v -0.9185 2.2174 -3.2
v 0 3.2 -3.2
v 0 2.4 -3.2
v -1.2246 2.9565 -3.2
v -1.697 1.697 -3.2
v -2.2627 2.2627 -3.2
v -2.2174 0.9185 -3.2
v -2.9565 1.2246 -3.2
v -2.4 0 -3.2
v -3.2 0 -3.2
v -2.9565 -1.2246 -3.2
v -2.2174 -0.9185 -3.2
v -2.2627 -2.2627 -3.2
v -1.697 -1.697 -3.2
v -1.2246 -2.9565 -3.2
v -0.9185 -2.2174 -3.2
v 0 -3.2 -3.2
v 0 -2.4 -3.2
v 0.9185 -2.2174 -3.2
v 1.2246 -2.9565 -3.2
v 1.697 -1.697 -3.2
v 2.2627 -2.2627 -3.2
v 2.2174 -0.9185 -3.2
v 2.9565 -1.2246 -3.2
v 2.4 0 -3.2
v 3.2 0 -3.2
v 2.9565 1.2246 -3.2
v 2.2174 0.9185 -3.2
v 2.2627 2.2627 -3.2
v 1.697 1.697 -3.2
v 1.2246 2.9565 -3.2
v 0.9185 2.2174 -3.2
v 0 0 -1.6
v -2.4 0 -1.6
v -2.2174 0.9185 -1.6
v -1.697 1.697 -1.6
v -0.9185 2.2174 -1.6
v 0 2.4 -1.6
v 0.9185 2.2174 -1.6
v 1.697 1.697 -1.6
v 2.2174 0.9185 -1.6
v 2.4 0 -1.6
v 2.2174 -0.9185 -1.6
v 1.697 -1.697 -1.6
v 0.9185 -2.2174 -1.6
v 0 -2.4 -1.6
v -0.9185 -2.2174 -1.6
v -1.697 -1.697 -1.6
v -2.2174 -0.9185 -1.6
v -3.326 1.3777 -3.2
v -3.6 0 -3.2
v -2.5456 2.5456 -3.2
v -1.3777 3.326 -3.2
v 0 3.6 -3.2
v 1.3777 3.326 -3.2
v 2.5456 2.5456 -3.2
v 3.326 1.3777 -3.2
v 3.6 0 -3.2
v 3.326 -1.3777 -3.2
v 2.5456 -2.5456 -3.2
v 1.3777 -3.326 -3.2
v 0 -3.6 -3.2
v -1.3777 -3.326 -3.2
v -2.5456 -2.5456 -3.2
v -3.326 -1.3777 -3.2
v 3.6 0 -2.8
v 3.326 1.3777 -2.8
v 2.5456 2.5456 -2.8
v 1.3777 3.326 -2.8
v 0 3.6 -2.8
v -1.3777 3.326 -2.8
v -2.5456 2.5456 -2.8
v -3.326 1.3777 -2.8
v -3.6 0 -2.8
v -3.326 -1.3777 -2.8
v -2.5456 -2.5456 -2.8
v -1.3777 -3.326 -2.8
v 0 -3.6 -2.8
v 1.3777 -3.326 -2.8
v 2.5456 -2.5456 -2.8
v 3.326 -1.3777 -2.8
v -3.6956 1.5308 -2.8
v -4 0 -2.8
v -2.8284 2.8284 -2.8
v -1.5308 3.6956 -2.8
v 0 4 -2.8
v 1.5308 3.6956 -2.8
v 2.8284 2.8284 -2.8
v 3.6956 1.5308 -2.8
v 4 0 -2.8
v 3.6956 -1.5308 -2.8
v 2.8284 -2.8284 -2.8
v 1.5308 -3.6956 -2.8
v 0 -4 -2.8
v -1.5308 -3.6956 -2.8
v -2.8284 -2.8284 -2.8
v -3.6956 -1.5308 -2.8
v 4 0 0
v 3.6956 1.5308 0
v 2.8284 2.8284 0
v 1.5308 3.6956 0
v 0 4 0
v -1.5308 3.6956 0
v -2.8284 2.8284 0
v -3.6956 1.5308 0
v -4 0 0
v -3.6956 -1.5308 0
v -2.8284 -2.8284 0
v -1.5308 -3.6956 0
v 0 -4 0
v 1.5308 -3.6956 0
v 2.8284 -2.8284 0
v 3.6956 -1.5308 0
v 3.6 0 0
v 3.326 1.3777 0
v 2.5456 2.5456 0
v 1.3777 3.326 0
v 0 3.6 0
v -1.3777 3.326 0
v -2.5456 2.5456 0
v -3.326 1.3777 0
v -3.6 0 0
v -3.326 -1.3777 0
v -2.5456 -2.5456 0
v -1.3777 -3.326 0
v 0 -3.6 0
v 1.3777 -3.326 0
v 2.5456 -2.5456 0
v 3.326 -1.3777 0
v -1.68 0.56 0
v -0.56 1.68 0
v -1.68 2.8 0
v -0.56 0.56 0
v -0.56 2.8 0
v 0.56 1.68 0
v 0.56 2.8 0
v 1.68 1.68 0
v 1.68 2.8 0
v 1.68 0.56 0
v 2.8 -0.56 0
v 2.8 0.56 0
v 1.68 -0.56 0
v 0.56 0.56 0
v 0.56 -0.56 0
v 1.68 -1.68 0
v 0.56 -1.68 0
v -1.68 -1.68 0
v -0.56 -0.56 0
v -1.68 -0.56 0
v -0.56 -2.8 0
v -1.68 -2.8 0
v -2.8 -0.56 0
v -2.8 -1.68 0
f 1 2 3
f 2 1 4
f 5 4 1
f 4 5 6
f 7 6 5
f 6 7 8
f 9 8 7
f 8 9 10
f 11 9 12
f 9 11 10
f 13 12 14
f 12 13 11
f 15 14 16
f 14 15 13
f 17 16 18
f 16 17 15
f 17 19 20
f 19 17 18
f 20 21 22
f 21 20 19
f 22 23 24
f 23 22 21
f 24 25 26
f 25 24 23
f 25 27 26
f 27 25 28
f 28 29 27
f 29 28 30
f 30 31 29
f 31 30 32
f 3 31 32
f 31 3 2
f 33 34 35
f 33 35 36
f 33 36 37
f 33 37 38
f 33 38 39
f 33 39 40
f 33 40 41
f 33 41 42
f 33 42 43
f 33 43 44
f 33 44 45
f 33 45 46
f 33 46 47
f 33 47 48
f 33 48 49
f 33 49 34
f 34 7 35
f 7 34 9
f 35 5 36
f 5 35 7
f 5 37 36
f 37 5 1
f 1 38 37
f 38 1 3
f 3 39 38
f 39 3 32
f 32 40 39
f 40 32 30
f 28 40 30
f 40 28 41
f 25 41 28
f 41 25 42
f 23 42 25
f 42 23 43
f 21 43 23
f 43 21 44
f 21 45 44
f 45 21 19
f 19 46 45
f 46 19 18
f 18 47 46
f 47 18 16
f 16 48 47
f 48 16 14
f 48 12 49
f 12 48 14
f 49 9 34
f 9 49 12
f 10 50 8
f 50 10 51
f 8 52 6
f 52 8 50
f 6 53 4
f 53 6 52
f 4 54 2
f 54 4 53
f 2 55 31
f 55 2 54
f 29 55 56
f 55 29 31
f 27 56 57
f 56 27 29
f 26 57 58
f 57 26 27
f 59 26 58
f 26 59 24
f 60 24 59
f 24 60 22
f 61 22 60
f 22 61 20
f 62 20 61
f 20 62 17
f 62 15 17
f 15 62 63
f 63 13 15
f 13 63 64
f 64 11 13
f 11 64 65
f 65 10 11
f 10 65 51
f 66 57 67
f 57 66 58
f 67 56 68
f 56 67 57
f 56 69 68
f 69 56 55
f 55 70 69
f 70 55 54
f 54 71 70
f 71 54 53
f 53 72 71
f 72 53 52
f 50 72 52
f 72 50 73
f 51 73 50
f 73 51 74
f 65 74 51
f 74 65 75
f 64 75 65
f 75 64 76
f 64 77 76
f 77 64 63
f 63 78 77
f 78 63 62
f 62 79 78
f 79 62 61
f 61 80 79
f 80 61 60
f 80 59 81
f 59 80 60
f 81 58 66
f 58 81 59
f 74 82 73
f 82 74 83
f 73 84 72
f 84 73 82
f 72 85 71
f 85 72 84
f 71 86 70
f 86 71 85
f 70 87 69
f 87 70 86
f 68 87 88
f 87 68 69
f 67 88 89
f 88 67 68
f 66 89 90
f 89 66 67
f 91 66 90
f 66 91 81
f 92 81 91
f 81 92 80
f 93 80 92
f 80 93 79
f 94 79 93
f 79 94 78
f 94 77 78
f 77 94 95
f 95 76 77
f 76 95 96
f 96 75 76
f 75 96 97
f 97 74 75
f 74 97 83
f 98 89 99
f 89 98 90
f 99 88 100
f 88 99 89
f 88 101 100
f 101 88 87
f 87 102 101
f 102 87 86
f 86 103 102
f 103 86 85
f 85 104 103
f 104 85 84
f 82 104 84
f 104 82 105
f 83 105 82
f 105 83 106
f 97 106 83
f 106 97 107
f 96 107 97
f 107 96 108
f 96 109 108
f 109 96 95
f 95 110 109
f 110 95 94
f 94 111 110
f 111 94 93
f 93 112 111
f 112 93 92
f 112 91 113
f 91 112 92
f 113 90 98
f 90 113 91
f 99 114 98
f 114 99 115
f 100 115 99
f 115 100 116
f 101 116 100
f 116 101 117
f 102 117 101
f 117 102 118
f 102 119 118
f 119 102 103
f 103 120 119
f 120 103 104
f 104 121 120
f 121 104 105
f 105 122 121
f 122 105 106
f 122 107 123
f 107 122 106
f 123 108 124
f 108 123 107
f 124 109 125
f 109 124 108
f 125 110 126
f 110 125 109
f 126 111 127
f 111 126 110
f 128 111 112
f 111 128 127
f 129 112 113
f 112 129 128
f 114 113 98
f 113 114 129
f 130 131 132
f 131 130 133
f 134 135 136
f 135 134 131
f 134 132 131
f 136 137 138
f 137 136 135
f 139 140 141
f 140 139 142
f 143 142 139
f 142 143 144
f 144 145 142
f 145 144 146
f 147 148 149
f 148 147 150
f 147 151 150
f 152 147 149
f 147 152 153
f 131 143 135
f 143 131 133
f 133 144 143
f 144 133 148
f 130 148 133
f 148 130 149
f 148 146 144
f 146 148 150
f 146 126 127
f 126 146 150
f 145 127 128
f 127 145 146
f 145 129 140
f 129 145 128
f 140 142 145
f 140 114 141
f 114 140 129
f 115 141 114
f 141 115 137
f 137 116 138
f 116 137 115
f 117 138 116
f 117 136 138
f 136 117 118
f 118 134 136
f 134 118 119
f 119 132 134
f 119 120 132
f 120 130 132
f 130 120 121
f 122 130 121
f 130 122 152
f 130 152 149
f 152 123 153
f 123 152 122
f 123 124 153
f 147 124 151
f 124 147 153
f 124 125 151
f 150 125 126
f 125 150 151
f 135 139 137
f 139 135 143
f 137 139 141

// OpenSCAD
// file: ../p/4-4disc.scad
use <../lib.scad>
function ldraw_lib__4_4disc() = [
// 0 Disc 1.0
// 0 Name: 4-4disc.dat
// 0 Author: James Jessiman
// 0 !LDRAW_ORG Primitive UPDATE 2002-02
// 0 !LICENSE Licensed under CC BY 4.0 : see CAreadme.txt
// 
// 0 BFC CERTIFY CCW
  [0,"BFC","CERTIFY"],
  [0,"BFC","CCW"],
// 
// 0 !HISTORY 1998-12-15 [PTadmin] Official Update 1998-10
// 0 !HISTORY 2002-03-23 [sbliss] Added BFC statement
// 0 !HISTORY 2002-04-25 [PTadmin] Official Update 2002-02
// 0 !HISTORY 2007-06-24 [PTadmin] Header formatted for Contributor Agreement
// 0 !HISTORY 2008-07-01 [PTadmin] Official Update 2008-01
// 
// 
// 3 16 0 0 0 1 0 0 0.9239 0 0.3827
  [3,16,0,0,0,1,0,0,0.9239,0,0.3827],
// 3 16 0 0 0 0.9239 0 0.3827 0.7071 0 0.7071
  [3,16,0,0,0,0.9239,0,0.3827,0.7071,0,0.7071],
// 3 16 0 0 0 0.7071 0 0.7071 0.3827 0 0.9239
  [3,16,0,0,0,0.7071,0,0.7071,0.3827,0,0.9239],
// 3 16 0 0 0 0.3827 0 0.9239 0 0 1
  [3,16,0,0,0,0.3827,0,0.9239,0,0,1],
// 3 16 0 0 0 0 0 1 -0.3827 0 0.9239
  [3,16,0,0,0,0,0,1,-0.3827,0,0.9239],
// 3 16 0 0 0 -0.3827 0 0.9239 -0.7071 0 0.7071
  [3,16,0,0,0,-0.3827,0,0.9239,-0.7071,0,0.7071],
// 3 16 0 0 0 -0.7071 0 0.7071 -0.9239 0 0.3827
  [3,16,0,0,0,-0.7071,0,0.7071,-0.9239,0,0.3827],
// 3 16 0 0 0 -0.9239 0 0.3827 -1 0 -0
  [3,16,0,0,0,-0.9239,0,0.3827,-1,0,-0],
// 3 16 0 0 0 -1 0 -0 -0.9239 0 -0.3827
  [3,16,0,0,0,-1,0,-0,-0.9239,0,-0.3827],
// 3 16 0 0 0 -0.9239 0 -0.3827 -0.7071 0 -0.7071
  [3,16,0,0,0,-0.9239,0,-0.3827,-0.7071,0,-0.7071],
// 3 16 0 0 0 -0.7071 0 -0.7071 -0.3827 0 -0.9239
  [3,16,0,0,0,-0.7071,0,-0.7071,-0.3827,0,-0.9239],
// 3 16 0 0 0 -0.3827 0 -0.9239 0 0 -1
  [3,16,0,0,0,-0.3827,0,-0.9239,0,0,-1],
// 3 16 0 0 0 0 0 -1 0.3827 0 -0.9239
  [3,16,0,0,0,0,0,-1,0.3827,0,-0.9239],
// 3 16 0 0 0 0.3827 0 -0.9239 0.7071 0 -0.7071
  [3,16,0,0,0,0.3827,0,-0.9239,0.7071,0,-0.7071],
// 3 16 0 0 0 0.7071 0 -0.7071 0.9239 0 -0.3827
  [3,16,0,0,0,0.7071,0,-0.7071,0.9239,0,-0.3827],
// 3 16 0 0 0 0.9239 0 -0.3827 1 0 0
  [3,16,0,0,0,0.9239,0,-0.3827,1,0,0],
// 0
];
module ldraw_lib__4_4disc(step=0, col=false, unit=2/5, alt=false, line=0.2, solid=!$preview)
    makepoly(ldraw_lib__4_4disc(), step=step, col=col, unit=unit, alt=alt, line=line, solid=solid);
ldraw_lib__4_4disc(line=0.2);
// file: ../p/4-4ring3.scad
use <../lib.scad>
function ldraw_lib__4_4ring3() = [
// 0 Ring  3 x 1.0
// 0 Name: 4-4ring3.dat
// 0 Author: James Jessiman
// 0 !LDRAW_ORG Primitive UPDATE 2009-01
// 0 !LICENSE Licensed under CC BY 4.0 : see CAreadme.txt
// 
// 0 BFC CERTIFY CCW
  [0,"BFC","CERTIFY"],
  [0,"BFC","CCW"],
// 
// 0 !HISTORY 1998-12-15 [PTadmin] Official Update 1998-10
// 0 !HISTORY 2002-04-05 [hafhead] Added BFC statement
// 0 !HISTORY 2002-04-25 [PTadmin] Official Update 2002-02
// 0 !HISTORY 2007-06-24 [PTadmin] Header formatted for Contributor Agreement
// 0 !HISTORY 2008-07-01 [PTadmin] Official Update 2008-01
// 0 !HISTORY 2008-08-26 [cwdee] Switch polygon winding and rename
// 0 !HISTORY 2009-05-02 [PTadmin] Official Update 2009-01
// 
// 
// 4 16 -1.5308 0 3.6956 -1.1481 0 2.7717 0 0 3 0 0 4
  [4,16,-1.5308,0,3.6956,-1.1481,0,2.7717,0,0,3,0,0,4],
// 4 16 -2.8284 0 2.8284 -2.1213 0 2.1213 -1.1481 0 2.7717 -1.5308 0 3.6956
  [4,16,-2.8284,0,2.8284,-2.1213,0,2.1213,-1.1481,0,2.7717,-1.5308,0,3.6956],
// 4 16 -3.6956 0 1.5308 -2.7717 0 1.1481 -2.1213 0 2.1213 -2.8284 0 2.8284
  [4,16,-3.6956,0,1.5308,-2.7717,0,1.1481,-2.1213,0,2.1213,-2.8284,0,2.8284],
// 4 16 -4 0 0 -3 0 0 -2.7717 0 1.1481 -3.6956 0 1.5308
  [4,16,-4,0,0,-3,0,0,-2.7717,0,1.1481,-3.6956,0,1.5308],
// 4 16 -3.6956 0 -1.5308 -2.7717 0 -1.1481 -3 0 0 -4 0 0
  [4,16,-3.6956,0,-1.5308,-2.7717,0,-1.1481,-3,0,0,-4,0,0],
// 4 16 -2.8284 0 -2.8284 -2.1213 0 -2.1213 -2.7717 0 -1.1481 -3.6956 0 -1.5308
  [4,16,-2.8284,0,-2.8284,-2.1213,0,-2.1213,-2.7717,0,-1.1481,-3.6956,0,-1.5308],
// 4 16 -1.5308 0 -3.6956 -1.1481 0 -2.7717 -2.1213 0 -2.1213 -2.8284 0 -2.8284
  [4,16,-1.5308,0,-3.6956,-1.1481,0,-2.7717,-2.1213,0,-2.1213,-2.8284,0,-2.8284],
// 4 16 0 0 -4 0 0 -3 -1.1481 0 -2.7717 -1.5308 0 -3.6956
  [4,16,0,0,-4,0,0,-3,-1.1481,0,-2.7717,-1.5308,0,-3.6956],
// 4 16 1.5308 0 -3.6956 1.1481 0 -2.7717 0 0 -3 0 0 -4
  [4,16,1.5308,0,-3.6956,1.1481,0,-2.7717,0,0,-3,0,0,-4],
// 4 16 2.8284 0 -2.8284 2.1213 0 -2.1213 1.1481 0 -2.7717 1.5308 0 -3.6956
  [4,16,2.8284,0,-2.8284,2.1213,0,-2.1213,1.1481,0,-2.7717,1.5308,0,-3.6956],
// 4 16 3.6956 0 -1.5308 2.7717 0 -1.1481 2.1213 0 -2.1213 2.8284 0 -2.8284
  [4,16,3.6956,0,-1.5308,2.7717,0,-1.1481,2.1213,0,-2.1213,2.8284,0,-2.8284],
// 4 16 4 0 0 3 0 0 2.7717 0 -1.1481 3.6956 0 -1.5308
  [4,16,4,0,0,3,0,0,2.7717,0,-1.1481,3.6956,0,-1.5308],
// 4 16 3.6956 0 1.5308 2.7717 0 1.1481 3 0 0 4 0 0
  [4,16,3.6956,0,1.5308,2.7717,0,1.1481,3,0,0,4,0,0],
// 4 16 2.8284 0 2.8284 2.1213 0 2.1213 2.7717 0 1.1481 3.6956 0 1.5308
  [4,16,2.8284,0,2.8284,2.1213,0,2.1213,2.7717,0,1.1481,3.6956,0,1.5308],
// 4 16 1.5308 0 3.6956 1.1481 0 2.7717 2.1213 0 2.1213 2.8284 0 2.8284
  [4,16,1.5308,0,3.6956,1.1481,0,2.7717,2.1213,0,2.1213,2.8284,0,2.8284],
// 4 16 0 0 4 0 0 3 1.1481 0 2.7717 1.5308 0 3.6956
  [4,16,0,0,4,0,0,3,1.1481,0,2.7717,1.5308,0,3.6956],
// 0
];
module ldraw_lib__4_4ring3(step=0, col=false, unit=2/5, alt=false, line=0.2, solid=!$preview)
    makepoly(ldraw_lib__4_4ring3(), step=step, col=col, unit=unit, alt=alt, line=line, solid=solid);
ldraw_lib__4_4ring3(line=0.2);
// file: ../p/4-4cylc.scad
use <../lib.scad>
use <4-4cyli.scad>
use <4-4disc.scad>
use <4-4edge.scad>
function ldraw_lib__4_4cylc() = [
// 0 Cylinder Closed 1.0
// 0 Name: 4-4cylc.dat
// 0 Author: Alex Taylor [anathema]
// 0 !LDRAW_ORG Primitive UPDATE 2009-02
// 0 !LICENSE Licensed under CC BY 4.0 : see CAreadme.txt
// 
// 0 BFC CERTIFY CCW
  [0,"BFC","CERTIFY"],
  [0,"BFC","CCW"],
// 
// 0 !HISTORY 2008-12-29 [cwdee] Removed one disc
// 0 !HISTORY 2009-09-03 [PTadmin] Official Update 2009-02
// 
// 
// 1 16 0 0 0 1 0 0 0 1 0 0 0 1 4-4edge.dat
  [1,16,0,0,0,1,0,0,0,1,0,0,0,1, ldraw_lib__4_4edge()],
// 1 16 0 1 0 1 0 0 0 1 0 0 0 1 4-4edge.dat
  [1,16,0,1,0,1,0,0,0,1,0,0,0,1, ldraw_lib__4_4edge()],
// 1 16 0 0 0 1 0 0 0 1 0 0 0 1 4-4disc.dat
  [1,16,0,0,0,1,0,0,0,1,0,0,0,1, ldraw_lib__4_4disc()],
// 1 16 0 0 0 1 0 0 0 1 0 0 0 1 4-4cyli.dat
  [1,16,0,0,0,1,0,0,0,1,0,0,0,1, ldraw_lib__4_4cyli()],
// 0
];
module ldraw_lib__4_4cylc(step=0, col=false, unit=2/5, alt=false, line=0.2, solid=!$preview)
    makepoly(ldraw_lib__4_4cylc(), step=step, col=col, unit=unit, alt=alt, line=line, solid=solid);
ldraw_lib__4_4cylc(line=0.2);
// file: ../p/4-4edge.scad
use <../lib.scad>
function ldraw_lib__4_4edge() = [
// 0 Circle 1.0
// 0 Name: 4-4edge.dat
// 0 Author: James Jessiman
// 0 !LDRAW_ORG Primitive UPDATE 2017-01
// 0 !LICENSE Licensed under CC BY 4.0 : see CAreadme.txt
// 
// 0 BFC CERTIFY CCW
  [0,"BFC","CERTIFY"],
  [0,"BFC","CCW"],
// 
// 0 !HISTORY 1998-12-15 [PTadmin] Official Update 1998-10
// 0 !HISTORY 2005-12-28 [PTadmin] Official Update 2005-01
// 0 !HISTORY 2007-06-24 [PTadmin] Header formatted for Contributor Agreement
// 0 !HISTORY 2008-07-01 [PTadmin] Official Update 2008-01
// 0 !HISTORY 2017-01-15 [Steffen] BFCed
// 0 !HISTORY 2017-12-30 [PTadmin] Official Update 2017-01
// 
// 
// 2 24 1 0 0 0.9239 0 0.3827
  [2,24,1,0,0,0.9239,0,0.3827],
// 2 24 0.9239 0 0.3827 0.7071 0 0.7071
  [2,24,0.9239,0,0.3827,0.7071,0,0.7071],
// 2 24 0.7071 0 0.7071 0.3827 0 0.9239
  [2,24,0.7071,0,0.7071,0.3827,0,0.9239],
// 2 24 0.3827 0 0.9239 0 0 1
  [2,24,0.3827,0,0.9239,0,0,1],
// 2 24 0 0 1 -0.3827 0 0.9239
  [2,24,0,0,1,-0.3827,0,0.9239],
// 2 24 -0.3827 0 0.9239 -0.7071 0 0.7071
  [2,24,-0.3827,0,0.9239,-0.7071,0,0.7071],
// 2 24 -0.7071 0 0.7071 -0.9239 0 0.3827
  [2,24,-0.7071,0,0.7071,-0.9239,0,0.3827],
// 2 24 -0.9239 0 0.3827 -1 0 -0
  [2,24,-0.9239,0,0.3827,-1,0,-0],
// 2 24 -1 0 -0 -0.9239 0 -0.3827
  [2,24,-1,0,-0,-0.9239,0,-0.3827],
// 2 24 -0.9239 0 -0.3827 -0.7071 0 -0.7071
  [2,24,-0.9239,0,-0.3827,-0.7071,0,-0.7071],
// 2 24 -0.7071 0 -0.7071 -0.3827 0 -0.9239
  [2,24,-0.7071,0,-0.7071,-0.3827,0,-0.9239],
// 2 24 -0.3827 0 -0.9239 0 0 -1
  [2,24,-0.3827,0,-0.9239,0,0,-1],
// 2 24 0 0 -1 0.3827 0 -0.9239
  [2,24,0,0,-1,0.3827,0,-0.9239],
// 2 24 0.3827 0 -0.9239 0.7071 0 -0.7071
  [2,24,0.3827,0,-0.9239,0.7071,0,-0.7071],
// 2 24 0.7071 0 -0.7071 0.9239 0 -0.3827
  [2,24,0.7071,0,-0.7071,0.9239,0,-0.3827],
// 2 24 0.9239 0 -0.3827 1 0 0
  [2,24,0.9239,0,-0.3827,1,0,0],
];
module ldraw_lib__4_4edge(step=0, col=false, unit=2/5, alt=false, line=0.2, solid=!$preview)
    makepoly(ldraw_lib__4_4edge(), step=step, col=col, unit=unit, alt=alt, line=line, solid=solid);
ldraw_lib__4_4edge(line=0.2);
// file: ../p/4-4cyli.scad
use <../lib.scad>
function ldraw_lib__4_4cyli() = [
// 0 Cylinder 1.0
// 0 Name: 4-4cyli.dat
// 0 Author: James Jessiman
// 0 !LDRAW_ORG Primitive UPDATE 2005-01
// 0 !LICENSE Licensed under CC BY 4.0 : see CAreadme.txt
// 
// 0 BFC CERTIFY CCW
  [0,"BFC","CERTIFY"],
  [0,"BFC","CCW"],
// 
// 0 !HISTORY 1998-12-15 [PTadmin] Official Update 1998-10
// 0 !HISTORY 2002-03-23 [sbliss] Added BFC statement; merged headers from files in distributions LDraw 0.27 and Complete.
// 0 !HISTORY 2002-04-25 [PTadmin] Official Update 2002-02
// 0 !HISTORY 2004-12-14 [guyvivan] BFC CCW
// 0 !HISTORY 2005-12-28 [PTadmin] Official Update 2005-01
// 0 !HISTORY 2007-06-24 [PTadmin] Header formatted for Contributor Agreement
// 0 !HISTORY 2008-07-01 [PTadmin] Official Update 2008-01
// 
// 
// 4 16 1 1 0 0.9239 1 0.3827 0.9239 0 0.3827 1 0 0
  [4,16,1,1,0,0.9239,1,0.3827,0.9239,0,0.3827,1,0,0],
// 5 24 1 0 0 1 1 0 0.9239 0 0.3827 0.9239 0 -0.3827
  [5,24,1,0,0,1,1,0,0.9239,0,0.3827,0.9239,0,-0.3827],
// 4 16 0.9239 1 0.3827 0.7071 1 0.7071 0.7071 0 0.7071 0.9239 0 0.3827
  [4,16,0.9239,1,0.3827,0.7071,1,0.7071,0.7071,0,0.7071,0.9239,0,0.3827],
// 5 24 0.9239 0 0.3827 0.9239 1 0.3827 0.7071 0 0.7071 1 0 0
  [5,24,0.9239,0,0.3827,0.9239,1,0.3827,0.7071,0,0.7071,1,0,0],
// 4 16 0.7071 1 0.7071 0.3827 1 0.9239 0.3827 0 0.9239 0.7071 0 0.7071
  [4,16,0.7071,1,0.7071,0.3827,1,0.9239,0.3827,0,0.9239,0.7071,0,0.7071],
// 5 24 0.7071 0 0.7071 0.7071 1 0.7071 0.3827 0 0.9239 0.9239 0 0.3827
  [5,24,0.7071,0,0.7071,0.7071,1,0.7071,0.3827,0,0.9239,0.9239,0,0.3827],
// 4 16 0.3827 1 0.9239 0 1 1 0 0 1 0.3827 0 0.9239
  [4,16,0.3827,1,0.9239,0,1,1,0,0,1,0.3827,0,0.9239],
// 5 24 0.3827 0 0.9239 0.3827 1 0.9239 0 0 1 0.7071 0 0.7071
  [5,24,0.3827,0,0.9239,0.3827,1,0.9239,0,0,1,0.7071,0,0.7071],
// 4 16 0 1 1 -0.3827 1 0.9239 -0.3827 0 0.9239 0 0 1
  [4,16,0,1,1,-0.3827,1,0.9239,-0.3827,0,0.9239,0,0,1],
// 5 24 0 0 1 0 1 1 -0.3827 0 0.9239 0.3827 0 0.9239
  [5,24,0,0,1,0,1,1,-0.3827,0,0.9239,0.3827,0,0.9239],
// 4 16 -0.3827 1 0.9239 -0.7071 1 0.7071 -0.7071 0 0.7071 -0.3827 0 0.9239
  [4,16,-0.3827,1,0.9239,-0.7071,1,0.7071,-0.7071,0,0.7071,-0.3827,0,0.9239],
// 5 24 -0.3827 0 0.9239 -0.3827 1 0.9239 -0.7071 0 0.7071 0 0 1
  [5,24,-0.3827,0,0.9239,-0.3827,1,0.9239,-0.7071,0,0.7071,0,0,1],
// 4 16 -0.7071 1 0.7071 -0.9239 1 0.3827 -0.9239 0 0.3827 -0.7071 0 0.7071
  [4,16,-0.7071,1,0.7071,-0.9239,1,0.3827,-0.9239,0,0.3827,-0.7071,0,0.7071],
// 5 24 -0.7071 0 0.7071 -0.7071 1 0.7071 -0.9239 0 0.3827 -0.3827 0 0.9239
  [5,24,-0.7071,0,0.7071,-0.7071,1,0.7071,-0.9239,0,0.3827,-0.3827,0,0.9239],
// 4 16 -0.9239 1 0.3827 -1 1 0 -1 0 0 -0.9239 0 0.3827
  [4,16,-0.9239,1,0.3827,-1,1,0,-1,0,0,-0.9239,0,0.3827],
// 5 24 -0.9239 0 0.3827 -0.9239 1 0.3827 -1 0 0 -0.7071 0 0.7071
  [5,24,-0.9239,0,0.3827,-0.9239,1,0.3827,-1,0,0,-0.7071,0,0.7071],
// 4 16 -1 1 0 -0.9239 1 -0.3827 -0.9239 0 -0.3827 -1 0 0
  [4,16,-1,1,0,-0.9239,1,-0.3827,-0.9239,0,-0.3827,-1,0,0],
// 5 24 -1 0 0 -1 1 0 -0.9239 0 -0.3827 -0.9239 0 0.3827
  [5,24,-1,0,0,-1,1,0,-0.9239,0,-0.3827,-0.9239,0,0.3827],
// 4 16 -0.9239 1 -0.3827 -0.7071 1 -0.7071 -0.7071 0 -0.7071 -0.9239 0 -0.3827
  [4,16,-0.9239,1,-0.3827,-0.7071,1,-0.7071,-0.7071,0,-0.7071,-0.9239,0,-0.3827],
// 5 24 -0.9239 0 -0.3827 -0.9239 1 -0.3827 -0.7071 0 -0.7071 -1 0 0
  [5,24,-0.9239,0,-0.3827,-0.9239,1,-0.3827,-0.7071,0,-0.7071,-1,0,0],
// 4 16 -0.7071 1 -0.7071 -0.3827 1 -0.9239 -0.3827 0 -0.9239 -0.7071 0 -0.7071
  [4,16,-0.7071,1,-0.7071,-0.3827,1,-0.9239,-0.3827,0,-0.9239,-0.7071,0,-0.7071],
// 5 24 -0.7071 0 -0.7071 -0.7071 1 -0.7071 -0.3827 0 -0.9239 -0.9239 0 -0.3827
  [5,24,-0.7071,0,-0.7071,-0.7071,1,-0.7071,-0.3827,0,-0.9239,-0.9239,0,-0.3827],
// 4 16 -0.3827 1 -0.9239 0 1 -1 0 0 -1 -0.3827 0 -0.9239
  [4,16,-0.3827,1,-0.9239,0,1,-1,0,0,-1,-0.3827,0,-0.9239],
// 5 24 -0.3827 0 -0.9239 -0.3827 1 -0.9239 0 0 -1 -0.7071 0 -0.7071
  [5,24,-0.3827,0,-0.9239,-0.3827,1,-0.9239,0,0,-1,-0.7071,0,-0.7071],
// 4 16 0 1 -1 0.3827 1 -0.9239 0.3827 0 -0.9239 0 0 -1
  [4,16,0,1,-1,0.3827,1,-0.9239,0.3827,0,-0.9239,0,0,-1],
// 5 24 0 0 -1 0 1 -1 0.3827 0 -0.9239 -0.3827 0 -0.9239
  [5,24,0,0,-1,0,1,-1,0.3827,0,-0.9239,-0.3827,0,-0.9239],
// 4 16 0.3827 1 -0.9239 0.7071 1 -0.7071 0.7071 0 -0.7071 0.3827 0 -0.9239
  [4,16,0.3827,1,-0.9239,0.7071,1,-0.7071,0.7071,0,-0.7071,0.3827,0,-0.9239],
// 5 24 0.3827 0 -0.9239 0.3827 1 -0.9239 0.7071 0 -0.7071 0 0 -1
  [5,24,0.3827,0,-0.9239,0.3827,1,-0.9239,0.7071,0,-0.7071,0,0,-1],
// 4 16 0.7071 1 -0.7071 0.9239 1 -0.3827 0.9239 0 -0.3827 0.7071 0 -0.7071
  [4,16,0.7071,1,-0.7071,0.9239,1,-0.3827,0.9239,0,-0.3827,0.7071,0,-0.7071],
// 5 24 0.7071 0 -0.7071 0.7071 1 -0.7071 0.9239 0 -0.3827 0.3827 0 -0.9239
  [5,24,0.7071,0,-0.7071,0.7071,1,-0.7071,0.9239,0,-0.3827,0.3827,0,-0.9239],
// 4 16 0.9239 1 -0.3827 1 1 0 1 0 0 0.9239 0 -0.3827
  [4,16,0.9239,1,-0.3827,1,1,0,1,0,0,0.9239,0,-0.3827],
// 5 24 0.9239 0 -0.3827 0.9239 1 -0.3827 1 0 0 0.7071 0 -0.7071
  [5,24,0.9239,0,-0.3827,0.9239,1,-0.3827,1,0,0,0.7071,0,-0.7071],
// 0
];
module ldraw_lib__4_4cyli(step=0, col=false, unit=2/5, alt=false, line=0.2, solid=!$preview)
    makepoly(ldraw_lib__4_4cyli(), step=step, col=col, unit=unit, alt=alt, line=line, solid=solid);
ldraw_lib__4_4cyli(line=0.2);
// file: ../p/stud4o.scad
use <../lib.scad>
use <4-4cylc.scad>
use <4-4ring3.scad>
function ldraw_lib__stud4o() = [
// 0 Stud Tube Open without Outer Cylinder
// 0 Name: stud4o.dat
// 0 Author: Magnus Forsberg [MagFors]
// 0 !LDRAW_ORG Primitive UPDATE 2011-02
// 0 !LICENSE Licensed under CC BY 4.0 : see CAreadme.txt
// 
// 0 !HELP This stud is a "antistud" to be used like a underside stud,
// 0 !HELP but without the outer cylinder.
// 0 !HELP 1 47 0 0 0 1 0 0 0 1 0 0 0 1 stud4.dat
// 
// 0 BFC CERTIFY CCW
  [0,"BFC","CERTIFY"],
  [0,"BFC","CCW"],
// 
// 0 !HISTORY 2011-12-29 [PTadmin] Official Update 2011-02
// 
// 
// 1 16 0 -4 0 2 0 0 0 1 0 0 0 2 4-4ring3.dat
  [1,16,0,-4,0,2,0,0,0,1,0,0,0,2, ldraw_lib__4_4ring3()],
// 0 BFC INVERTNEXT
  [0,"BFC","INVERTNEXT"],
// 1 16 0 0 0 -6 0 0 0 -4 0 0 0 6 4-4cylc.dat
  [1,16,0,0,0,-6,0,0,0,-4,0,0,0,6, ldraw_lib__4_4cylc()],
];
module ldraw_lib__stud4o(step=0, col=false, unit=2/5, alt=false, line=0.2, solid=!$preview)
    makepoly(ldraw_lib__stud4o(), step=step, col=col, unit=unit, alt=alt, line=line, solid=solid);
ldraw_lib__stud4o(line=0.2);
// file: ../p/4-4ring8.scad
use <../lib.scad>
function ldraw_lib__4_4ring8() = [
// 0 Ring  8 x 1.0
// 0 Name: 4-4ring8.dat
// 0 Author: Steffen [Steffen]
// 0 !LDRAW_ORG Primitive UPDATE 2012-01
// 0 !LICENSE Licensed under CC BY 4.0 : see CAreadme.txt
// 
// 0 BFC CERTIFY CCW
  [0,"BFC","CERTIFY"],
  [0,"BFC","CCW"],
// 
// 0 !HISTORY 2003-12-19 [PTadmin] Official Update 2003-03
// 0 !HISTORY 2007-06-24 [PTadmin] Header formatted for Contributor Agreement
// 0 !HISTORY 2008-07-01 [PTadmin] Official Update 2008-01
// 0 !HISTORY 2012-02-16 [Philo] Changed to CCW
// 0 !HISTORY 2012-03-30 [PTadmin] Official Update 2012-01
// 
// 
// 4 16 9 0 0 8.3151 0 3.4443 7.3912 0 3.0616 8 0 0
  [4,16,9,0,0,8.3151,0,3.4443,7.3912,0,3.0616,8,0,0],
// 4 16 8.3151 0 3.4443 6.3639 0 6.3639 5.6568 0 5.6568 7.3912 0 3.0616
  [4,16,8.3151,0,3.4443,6.3639,0,6.3639,5.6568,0,5.6568,7.3912,0,3.0616],
// 4 16 6.3639 0 6.3639 3.4443 0 8.3151 3.0616 0 7.3912 5.6568 0 5.6568
  [4,16,6.3639,0,6.3639,3.4443,0,8.3151,3.0616,0,7.3912,5.6568,0,5.6568],
// 4 16 3.4443 0 8.3151 0 0 9 0 0 8 3.0616 0 7.3912
  [4,16,3.4443,0,8.3151,0,0,9,0,0,8,3.0616,0,7.3912],
// 4 16 0 0 9 -3.4443 0 8.3151 -3.0616 0 7.3912 0 0 8
  [4,16,0,0,9,-3.4443,0,8.3151,-3.0616,0,7.3912,0,0,8],
// 4 16 -3.4443 0 8.3151 -6.3639 0 6.3639 -5.6568 0 5.6568 -3.0616 0 7.3912
  [4,16,-3.4443,0,8.3151,-6.3639,0,6.3639,-5.6568,0,5.6568,-3.0616,0,7.3912],
// 4 16 -6.3639 0 6.3639 -8.3151 0 3.4443 -7.3912 0 3.0616 -5.6568 0 5.6568
  [4,16,-6.3639,0,6.3639,-8.3151,0,3.4443,-7.3912,0,3.0616,-5.6568,0,5.6568],
// 4 16 -8.3151 0 3.4443 -9 0 0 -8 0 0 -7.3912 0 3.0616
  [4,16,-8.3151,0,3.4443,-9,0,0,-8,0,0,-7.3912,0,3.0616],
// 4 16 -9 0 0 -8.3151 0 -3.4443 -7.3912 0 -3.0616 -8 0 0
  [4,16,-9,0,0,-8.3151,0,-3.4443,-7.3912,0,-3.0616,-8,0,0],
// 4 16 -8.3151 0 -3.4443 -6.3639 0 -6.3639 -5.6568 0 -5.6568 -7.3912 0 -3.0616
  [4,16,-8.3151,0,-3.4443,-6.3639,0,-6.3639,-5.6568,0,-5.6568,-7.3912,0,-3.0616],
// 4 16 -6.3639 0 -6.3639 -3.4443 0 -8.3151 -3.0616 0 -7.3912 -5.6568 0 -5.6568
  [4,16,-6.3639,0,-6.3639,-3.4443,0,-8.3151,-3.0616,0,-7.3912,-5.6568,0,-5.6568],
// 4 16 -3.4443 0 -8.3151 0 0 -9 0 0 -8 -3.0616 0 -7.3912
  [4,16,-3.4443,0,-8.3151,0,0,-9,0,0,-8,-3.0616,0,-7.3912],
// 4 16 0 0 -9 3.4443 0 -8.3151 3.0616 0 -7.3912 0 0 -8
  [4,16,0,0,-9,3.4443,0,-8.3151,3.0616,0,-7.3912,0,0,-8],
// 4 16 3.4443 0 -8.3151 6.3639 0 -6.3639 5.6568 0 -5.6568 3.0616 0 -7.3912
  [4,16,3.4443,0,-8.3151,6.3639,0,-6.3639,5.6568,0,-5.6568,3.0616,0,-7.3912],
// 4 16 6.3639 0 -6.3639 8.3151 0 -3.4443 7.3912 0 -3.0616 5.6568 0 -5.6568
  [4,16,6.3639,0,-6.3639,8.3151,0,-3.4443,7.3912,0,-3.0616,5.6568,0,-5.6568],
// 4 16 8.3151 0 -3.4443 9 0 0 8 0 0 7.3912 0 -3.0616
  [4,16,8.3151,0,-3.4443,9,0,0,8,0,0,7.3912,0,-3.0616],
];
module ldraw_lib__4_4ring8(step=0, col=false, unit=2/5, alt=false, line=0.2, solid=!$preview)
    makepoly(ldraw_lib__4_4ring8(), step=step, col=col, unit=unit, alt=alt, line=line, solid=solid);
ldraw_lib__4_4ring8(line=0.2);
// file: ../p/4-4cylo.scad
use <../lib.scad>
use <4-4cyli.scad>
use <4-4edge.scad>
function ldraw_lib__4_4cylo() = [
// 0 Cylinder Open 1.0
// 0 Name: 4-4cylo.dat
// 0 Author: Mark Kennedy [mkennedy]
// 0 !LDRAW_ORG Primitive UPDATE 2010-01
// 0 !LICENSE Licensed under CC BY 4.0 : see CAreadme.txt
// 
// 0 BFC CERTIFY CCW
  [0,"BFC","CERTIFY"],
  [0,"BFC","CCW"],
// 
// 0 !HISTORY 2010-04-05 [PTadmin] Official Update 2010-01
// 
// 
// 1 16 0 0 0 1 0 0 0 1 0 0 0 1 4-4edge.dat
  [1,16,0,0,0,1,0,0,0,1,0,0,0,1, ldraw_lib__4_4edge()],
// 1 16 0 1 0 1 0 0 0 1 0 0 0 1 4-4edge.dat
  [1,16,0,1,0,1,0,0,0,1,0,0,0,1, ldraw_lib__4_4edge()],
// 1 16 0 0 0 1 0 0 0 1 0 0 0 1 4-4cyli.dat
  [1,16,0,0,0,1,0,0,0,1,0,0,0,1, ldraw_lib__4_4cyli()],
// 0
];
module ldraw_lib__4_4cylo(step=0, col=false, unit=2/5, alt=false, line=0.2, solid=!$preview)
    makepoly(ldraw_lib__4_4cylo(), step=step, col=col, unit=unit, alt=alt, line=line, solid=solid);
ldraw_lib__4_4cylo(line=0.2);
// file: ../p/empty.scad
use <../lib.scad>
function ldraw_lib__empty() = [
// 0 Empty
// 0 Name: empty.dat
// 0 Author: Steffen [Steffen]
// 0 !LDRAW_ORG Primitive UPDATE 2015-01
// 0 !LICENSE Licensed under CC BY 4.0 : see CAreadme.txt
// 
// 0 BFC CERTIFY CCW
  [0,"BFC","CERTIFY"],
  [0,"BFC","CCW"],
// 
// 0 !HISTORY 2015-10-11 [PTadmin] Official Update 2015-01
// 
// 
// 0 // Tool MLCad cannot handle really empty files. This file is used as a workaround.
// 0 // It exceptionally contains forbidden non-LDRAW standard syntax to satisfy MLCad until it is fixed OR a different editor has become the de-facto LDRAW standard.
// 0 // The line being used here is an "impossible" conditional line which never should be visible,
// 0 // additionally hidden by a syntax explicitly hiding it from displaying.
// 
// 0 MLCAD HIDE 5 24 0 0 0 0.0001 0 0 0.0001 -0.0001 0 0 0 0
];
module ldraw_lib__empty(step=0, col=false, unit=2/5, alt=false, line=0.2, solid=!$preview)
    makepoly(ldraw_lib__empty(), step=step, col=col, unit=unit, alt=alt, line=line, solid=solid);
ldraw_lib__empty(line=0.2);
// file: s/98138s02.scad
use <../../lib.scad>
use <../../p/4-4cylo.scad>
use <../../p/4-4ring8.scad>
use <../../p/4-4ring9.scad>
use <../../p/stud4o.scad>
function ldraw_lib__s__98138s02() = [
// 0 ~Tile  1 x  1 Round with Groove without Complete Top Face
// 0 Name: s\98138s02.dat
// 0 Author: Magnus Forsberg [MagFors]
// 0 !LDRAW_ORG Subpart UPDATE 2020-01
// 0 !LICENSE Licensed under CC BY 4.0 : see CAreadme.txt
// 
// 0 BFC CERTIFY CCW
  [0,"BFC","CERTIFY"],
  [0,"BFC","CCW"],
// 
// 0 !HISTORY 2020-06-28 [PTadmin] Official Update 2020-01
// 
// 
// 1 16 0 4 0 1 0 0 0 -1 0 0 0 1 stud4o.dat
  [1,16,0,4,0,1,0,0,0,-1,0,0,0,1, ldraw_lib__stud4o()],
// 1 16 0 8 0 -1 0 0 0 -1 0 0 0 1 4-4ring8.dat
  [1,16,0,8,0,-1,0,0,0,-1,0,0,0,1, ldraw_lib__4_4ring8()],
// 1 16 0 7 0 9 0 0 0 1 0 0 0 9 4-4cylo.dat
  [1,16,0,7,0,9,0,0,0,1,0,0,0,9, ldraw_lib__4_4cylo()],
// 1 16 0 7 0 -1 0 0 0 -1 0 0 0 1 4-4ring9.dat
  [1,16,0,7,0,-1,0,0,0,-1,0,0,0,1, ldraw_lib__4_4ring9()],
// 1 16 0 0 0 10 0 0 0 7 0 0 0 10 4-4cylo.dat
  [1,16,0,0,0,10,0,0,0,7,0,0,0,10, ldraw_lib__4_4cylo()],
];
module ldraw_lib__s__98138s02(step=0, col=false, unit=2/5, alt=false, line=0.2, solid=!$preview)
    makepoly(ldraw_lib__s__98138s02(), step=step, col=col, unit=unit, alt=alt, line=line, solid=solid);
ldraw_lib__s__98138s02(line=0.2);
// file: ../p/4-4ring9.scad
use <../lib.scad>
function ldraw_lib__4_4ring9() = [
// 0 Ring  9 x 1.0
// 0 Name: 4-4ring9.dat
// 0 Author: Magnus Forsberg [MagFors]
// 0 !LDRAW_ORG Primitive UPDATE 2024-01
// 0 !LICENSE Licensed under CC BY 4.0 : see CAreadme.txt
// 
// 0 BFC CERTIFY CCW
  [0,"BFC","CERTIFY"],
  [0,"BFC","CCW"],
// 
// 0 !HISTORY 2004-04-22 [PTadmin] Official Update 2004-02
// 0 !HISTORY 2007-06-24 [PTadmin] Header formatted for Contributor Agreement
// 0 !HISTORY 2008-07-01 [PTadmin] Official Update 2008-01
// 0 !HISTORY 2024-01-04 [MagFors] Complete regeneration, original by jriley
// 0 !HISTORY 2024-01-29 [OrionP] Official Update 2024-01
// 
// 4 16 10 0 0 9.239 0 3.827 8.3151 0 3.4443 9 0 0
  [4,16,10,0,0,9.239,0,3.827,8.3151,0,3.4443,9,0,0],
// 4 16 9.239 0 3.827 7.071 0 7.071 6.3639 0 6.3639 8.3151 0 3.4443
  [4,16,9.239,0,3.827,7.071,0,7.071,6.3639,0,6.3639,8.3151,0,3.4443],
// 4 16 7.071 0 7.071 3.827 0 9.239 3.4443 0 8.3151 6.3639 0 6.3639
  [4,16,7.071,0,7.071,3.827,0,9.239,3.4443,0,8.3151,6.3639,0,6.3639],
// 4 16 3.827 0 9.239 0 0 10 0 0 9 3.4443 0 8.3151
  [4,16,3.827,0,9.239,0,0,10,0,0,9,3.4443,0,8.3151],
// 4 16 0 0 10 -3.827 0 9.239 -3.4443 0 8.3151 0 0 9
  [4,16,0,0,10,-3.827,0,9.239,-3.4443,0,8.3151,0,0,9],
// 4 16 -3.827 0 9.239 -7.071 0 7.071 -6.3639 0 6.3639 -3.4443 0 8.3151
  [4,16,-3.827,0,9.239,-7.071,0,7.071,-6.3639,0,6.3639,-3.4443,0,8.3151],
// 4 16 -7.071 0 7.071 -9.239 0 3.827 -8.3151 0 3.4443 -6.3639 0 6.3639
  [4,16,-7.071,0,7.071,-9.239,0,3.827,-8.3151,0,3.4443,-6.3639,0,6.3639],
// 4 16 -9.239 0 3.827 -10 0 0 -9 0 0 -8.3151 0 3.4443
  [4,16,-9.239,0,3.827,-10,0,0,-9,0,0,-8.3151,0,3.4443],
// 4 16 -10 0 0 -9.239 0 -3.827 -8.3151 0 -3.4443 -9 0 0
  [4,16,-10,0,0,-9.239,0,-3.827,-8.3151,0,-3.4443,-9,0,0],
// 4 16 -9.239 0 -3.827 -7.071 0 -7.071 -6.3639 0 -6.3639 -8.3151 0 -3.4443
  [4,16,-9.239,0,-3.827,-7.071,0,-7.071,-6.3639,0,-6.3639,-8.3151,0,-3.4443],
// 4 16 -7.071 0 -7.071 -3.827 0 -9.239 -3.4443 0 -8.3151 -6.3639 0 -6.3639
  [4,16,-7.071,0,-7.071,-3.827,0,-9.239,-3.4443,0,-8.3151,-6.3639,0,-6.3639],
// 4 16 -3.827 0 -9.239 0 0 -10 0 0 -9 -3.4443 0 -8.3151
  [4,16,-3.827,0,-9.239,0,0,-10,0,0,-9,-3.4443,0,-8.3151],
// 4 16 0 0 -10 3.827 0 -9.239 3.4443 0 -8.3151 0 0 -9
  [4,16,0,0,-10,3.827,0,-9.239,3.4443,0,-8.3151,0,0,-9],
// 4 16 3.827 0 -9.239 7.071 0 -7.071 6.3639 0 -6.3639 3.4443 0 -8.3151
  [4,16,3.827,0,-9.239,7.071,0,-7.071,6.3639,0,-6.3639,3.4443,0,-8.3151],
// 4 16 7.071 0 -7.071 9.239 0 -3.827 8.3151 0 -3.4443 6.3639 0 -6.3639
  [4,16,7.071,0,-7.071,9.239,0,-3.827,8.3151,0,-3.4443,6.3639,0,-6.3639],
// 4 16 9.239 0 -3.827 10 0 0 9 0 0 8.3151 0 -3.4443
  [4,16,9.239,0,-3.827,10,0,0,9,0,0,8.3151,0,-3.4443],
// 0 // Build by LDPartEditor (PrimGen 2.X)
];
module ldraw_lib__4_4ring9(step=0, col=false, unit=2/5, alt=false, line=0.2, solid=!$preview)
    makepoly(ldraw_lib__4_4ring9(), step=step, col=col, unit=unit, alt=alt, line=line, solid=solid);
ldraw_lib__4_4ring9(line=0.2);
// file: ../p/1-16chrd.scad
use <../lib.scad>
use <empty.scad>
function ldraw_lib__1_16chrd() = [
// 0 Chord 0.0625
// 0 Name: 1-16chrd.dat
// 0 Author: Philippe Hurbain [Philo]
// 0 !LDRAW_ORG Primitive UPDATE 2015-01
// 0 !LICENSE Licensed under CC BY 4.0 : see CAreadme.txt
// 
// 0 BFC CERTIFY CCW
  [0,"BFC","CERTIFY"],
  [0,"BFC","CCW"],
// 
// 0 !HISTORY 2015-10-11 [PTadmin] Official Update 2015-01
// 
// 
// 0 // This file is intentionally empty because at the current \P resolution,
// 0 // an 1-16chrd is actually empty. However, this file still is present
// 0 // to allow tools to do primitives substition and fill in a real chrd here,
// 0 // or, if desired, to substitute this with the hi-res 48\1-16chrd.
// 
// 0 // This file is based on an idea by Darats at http://forums.ldraw.org/read.php?19,14500,14500#msg-14500
// 
// 1 16 0 0 0 1 0 0 0 1 0 0 0 1 empty.dat
  [1,16,0,0,0,1,0,0,0,1,0,0,0,1, ldraw_lib__empty()],
];
module ldraw_lib__1_16chrd(step=0, col=false, unit=2/5, alt=false, line=0.2, solid=!$preview)
    makepoly(ldraw_lib__1_16chrd(), step=step, col=col, unit=unit, alt=alt, line=line, solid=solid);
ldraw_lib__1_16chrd(line=0.2);
// file: s/98138s01.scad
use <../../lib.scad>
use <../../p/4-4ring9.scad>
use <98138s02.scad>
function ldraw_lib__s__98138s01() = [
// 0 ~Tile  1 x  1 Round with Groove with Partial Top Face
// 0 Name: s\98138s01.dat
// 0 Author: Magnus Forsberg [MagFors]
// 0 !LDRAW_ORG Subpart UPDATE 2020-01
// 0 !LICENSE Licensed under CC BY 4.0 : see CAreadme.txt
// 
// 0 BFC CERTIFY CCW
  [0,"BFC","CERTIFY"],
  [0,"BFC","CCW"],
// 
// 0 !HISTORY 2011-12-29 [PTadmin] Official Update 2011-02
// 0 !HISTORY 2016-06-17 [MagFors] Reduced the rounded edge to 0.5 ldu
// 0 !HISTORY 2016-12-31 [PTadmin] Official Update 2016-01
// 0 !HISTORY 2019-06-17 [MagFors] Removed the rounded edge
// 0 !HISTORY 2019-07-19 [MagFors] Subfiled without top surface
// 0 !HISTORY 2020-06-28 [PTadmin] Official Update 2020-01
// 
// 
// 1 16 0 0 0 1 0 0 0 1 0 0 0 1 s\98138s02.dat
  [1,16,0,0,0,1,0,0,0,1,0,0,0,1, ldraw_lib__s__98138s02()],
// 1 16 0 0 0 1 0 0 0 1 0 0 0 1 4-4ring9.dat
  [1,16,0,0,0,1,0,0,0,1,0,0,0,1, ldraw_lib__4_4ring9()],
];
module ldraw_lib__s__98138s01(step=0, col=false, unit=2/5, alt=false, line=0.2, solid=!$preview)
    makepoly(ldraw_lib__s__98138s01(), step=step, col=col, unit=unit, alt=alt, line=line, solid=solid);
ldraw_lib__s__98138s01(line=0.2);
// file: ../p/4-4ering.scad
use <../lib.scad>
use <1-16chrd.scad>
function ldraw_lib__4_4ering() = [
// 0 Adapter Ring Triangles to Normal 1.0
// 0 Name: 4-4ering.dat
// 0 Author: Philippe Hurbain [Philo]
// 0 !LDRAW_ORG Primitive UPDATE 2015-01
// 0 !LICENSE Licensed under CC BY 4.0 : see CAreadme.txt
// 
// 0 BFC CERTIFY CCW
  [0,"BFC","CERTIFY"],
  [0,"BFC","CCW"],
// 
// 0 !HISTORY 2015-10-11 [PTadmin] Official Update 2015-01
// 
// 
// 0 // This file uses 1-16chrd (actually empty). It allows
// 0 // tools to do primitives substition and fill in a ring of chrd here,
// 0 // or, if desired, to substitute this with the hi-res 48\1-16chrd.
// 0 // This file is based on an idea by Darats at http://forums.ldraw.org/read.php?19,14500,14500#msg-14500
// 
// 1 16 0 0 0 1 0 0 0 1 0 0 0 1 1-16chrd.dat
  [1,16,0,0,0,1,0,0,0,1,0,0,0,1, ldraw_lib__1_16chrd()],
// 1 16 0 0 0 0.92388 0 0.38268 0 1 0 -0.38268 0 0.92388 1-16chrd.dat
  [1,16,0,0,0,0.92388,0,0.38268,0,1,0,-0.38268,0,0.92388, ldraw_lib__1_16chrd()],
// 1 16 0 0 0 0.70711 0 0.70711 0 1 0 -0.70711 0 0.70711 1-16chrd.dat
  [1,16,0,0,0,0.70711,0,0.70711,0,1,0,-0.70711,0,0.70711, ldraw_lib__1_16chrd()],
// 1 16 0 0 0 0.38268 0 0.92388 0 1 0 -0.92388 0 0.38268 1-16chrd.dat
  [1,16,0,0,0,0.38268,0,0.92388,0,1,0,-0.92388,0,0.38268, ldraw_lib__1_16chrd()],
// 1 16 0 0 0 0 0 1 0 1 0 -1 0 0 1-16chrd.dat
  [1,16,0,0,0,0,0,1,0,1,0,-1,0,0, ldraw_lib__1_16chrd()],
// 1 16 0 0 0 -0.38268 0 0.92388 0 1 0 -0.92388 0 -0.38268 1-16chrd.dat
  [1,16,0,0,0,-0.38268,0,0.92388,0,1,0,-0.92388,0,-0.38268, ldraw_lib__1_16chrd()],
// 1 16 0 0 0 -0.70711 0 0.70711 0 1 0 -0.70711 0 -0.70711 1-16chrd.dat
  [1,16,0,0,0,-0.70711,0,0.70711,0,1,0,-0.70711,0,-0.70711, ldraw_lib__1_16chrd()],
// 1 16 0 0 0 -0.92388 0 0.38268 0 1 0 -0.38268 0 -0.92388 1-16chrd.dat
  [1,16,0,0,0,-0.92388,0,0.38268,0,1,0,-0.38268,0,-0.92388, ldraw_lib__1_16chrd()],
// 1 16 0 0 0 0 0 -1 0 1 0 1 0 0 1-16chrd.dat
  [1,16,0,0,0,0,0,-1,0,1,0,1,0,0, ldraw_lib__1_16chrd()],
// 1 16 0 0 0 0.38268 0 -0.92388 0 1 0 0.92388 0 0.38268 1-16chrd.dat
  [1,16,0,0,0,0.38268,0,-0.92388,0,1,0,0.92388,0,0.38268, ldraw_lib__1_16chrd()],
// 1 16 0 0 0 0.70711 0 -0.70711 0 1 0 0.70711 0 0.70711 1-16chrd.dat
  [1,16,0,0,0,0.70711,0,-0.70711,0,1,0,0.70711,0,0.70711, ldraw_lib__1_16chrd()],
// 1 16 0 0 0 0.92388 0 -0.38268 0 1 0 0.38268 0 0.92388 1-16chrd.dat
  [1,16,0,0,0,0.92388,0,-0.38268,0,1,0,0.38268,0,0.92388, ldraw_lib__1_16chrd()],
// 1 16 0 0 0 -1 0 0 0 1 0 0 0 -1 1-16chrd.dat
  [1,16,0,0,0,-1,0,0,0,1,0,0,0,-1, ldraw_lib__1_16chrd()],
// 1 16 0 0 0 -0.92388 0 -0.38268 0 1 0 0.38268 0 -0.92388 1-16chrd.dat
  [1,16,0,0,0,-0.92388,0,-0.38268,0,1,0,0.38268,0,-0.92388, ldraw_lib__1_16chrd()],
// 1 16 0 0 0 -0.70711 0 -0.70711 0 1 0 0.70711 0 -0.70711 1-16chrd.dat
  [1,16,0,0,0,-0.70711,0,-0.70711,0,1,0,0.70711,0,-0.70711, ldraw_lib__1_16chrd()],
// 1 16 0 0 0 -0.38268 0 -0.92388 0 1 0 0.92388 0 -0.38268 1-16chrd.dat
  [1,16,0,0,0,-0.38268,0,-0.92388,0,1,0,0.92388,0,-0.38268, ldraw_lib__1_16chrd()],
];
module ldraw_lib__4_4ering(step=0, col=false, unit=2/5, alt=false, line=0.2, solid=!$preview)
    makepoly(ldraw_lib__4_4ering(), step=step, col=col, unit=unit, alt=alt, line=line, solid=solid);
ldraw_lib__4_4ering(line=0.2);
// main file
use <../lib.scad>
use <../p/4-4ering.scad>
use <s/98138s01.scad>
function ldraw_lib__98138px9() = [
// 0 Tile  1 x  1 Round with Dark Brown and Dark Tan Rectangles and Squares Pattern
// 0 Name: 98138px9.dat
// 0 Author: Gerald Lasser [GeraldLasser]
// 0 !LDRAW_ORG Part UPDATE 2022-06
// 0 !LICENSE Licensed under CC BY 4.0 : see CAreadme.txt
// 
// 0 BFC CERTIFY CCW
  [0,"BFC","CERTIFY"],
  [0,"BFC","CCW"],
// 
// 0 !KEYWORDS Bricklink 98138pb081, Minecraft, Rebrickable 98138pr0078, set 21140
// 0 !KEYWORDS Set 21144
// 
// 0 !HISTORY 2022-12-20 [PTadmin] Official Update 2022-06
// 
// 
// 1 16 0 0 0 1 0 0 0 1 0 0 0 1 s\98138s01.dat
  [1,16,0,0,0,1,0,0,0,1,0,0,0,1, ldraw_lib__s__98138s01()],
// 1 16 0 0 0 9 0 0 0 1 0 0 0 9 4-4ering.dat
  [1,16,0,0,0,9,0,0,0,1,0,0,0,9, ldraw_lib__4_4ering()],
// 4 28 -4.2 0 1.4 -1.4 0 1.4 -1.4 0 4.2 -4.2 0 7
  [4,28,-4.2,0,1.4,-1.4,0,1.4,-1.4,0,4.2,-4.2,0,7],
// 4 308 -1.4 0 4.2 1.4 0 4.2 1.4 0 7 -1.4 0 7
  [4,308,-1.4,0,4.2,1.4,0,4.2,1.4,0,7,-1.4,0,7],
// 3 28 -1.4 0 7 -4.2 0 7 -1.4 0 4.2
  [3,28,-1.4,0,7,-4.2,0,7,-1.4,0,4.2],
// 4 28 1.4 0 4.2 4.2 0 4.2 4.2 0 7 1.4 0 7
  [4,28,1.4,0,4.2,4.2,0,4.2,4.2,0,7,1.4,0,7],
// 4 28 4.2 0 -1.4 7 0 -1.4 7 0 1.4 4.2 0 1.4
  [4,28,4.2,0,-1.4,7,0,-1.4,7,0,1.4,4.2,0,1.4],
// 4 308 1.4 0 -1.4 4.2 0 -1.4 4.2 0 1.4 1.4 0 1.4
  [4,308,1.4,0,-1.4,4.2,0,-1.4,4.2,0,1.4,1.4,0,1.4],
// 4 28 1.4 0 -4.2 4.2 0 -4.2 4.2 0 -1.4 1.4 0 -1.4
  [4,28,1.4,0,-4.2,4.2,0,-4.2,4.2,0,-1.4,1.4,0,-1.4],
// 4 308 -4.2 0 -4.2 -1.4 0 -7 -1.4 0 -1.4 -4.2 0 -1.4
  [4,308,-4.2,0,-4.2,-1.4,0,-7,-1.4,0,-1.4,-4.2,0,-1.4],
// 3 308 -4.2 0 -4.2 -4.2 0 -7 -1.4 0 -7
  [3,308,-4.2,0,-4.2,-4.2,0,-7,-1.4,0,-7],
// 4 28 -7 0 -4.2 -4.2 0 -4.2 -4.2 0 -1.4 -7 0 -1.4
  [4,28,-7,0,-4.2,-4.2,0,-4.2,-4.2,0,-1.4,-7,0,-1.4],
// 4 16 1.4 0 4.2 -1.4 0 4.2 -1.4 0 1.4 1.4 0 1.4
  [4,16,1.4,0,4.2,-1.4,0,4.2,-1.4,0,1.4,1.4,0,1.4],
// 4 16 1.4 0 1.4 -1.4 0 1.4 -1.4 0 -1.4 1.4 0 -1.4
  [4,16,1.4,0,1.4,-1.4,0,1.4,-1.4,0,-1.4,1.4,0,-1.4],
// 4 16 -1.4 0 1.4 -4.2 0 1.4 -4.2 0 -1.4 -1.4 0 -1.4
  [4,16,-1.4,0,1.4,-4.2,0,1.4,-4.2,0,-1.4,-1.4,0,-1.4],
// 4 16 1.4 0 -1.4 -1.4 0 -1.4 -1.4 0 -7 1.4 0 -4.2
  [4,16,1.4,0,-1.4,-1.4,0,-1.4,-1.4,0,-7,1.4,0,-4.2],
// 4 16 -1.4 0 -7 0 0 -9 3.4443 0 -8.3151 1.4 0 -4.2
  [4,16,-1.4,0,-7,0,0,-9,3.4443,0,-8.3151,1.4,0,-4.2],
// 4 16 4.2 0 -4.2 1.4 0 -4.2 3.4443 0 -8.3151 6.3639 0 -6.3639
  [4,16,4.2,0,-4.2,1.4,0,-4.2,3.4443,0,-8.3151,6.3639,0,-6.3639],
// 4 16 4.2 0 -4.2 6.3639 0 -6.3639 8.3151 0 -3.4443 7 0 -1.4
  [4,16,4.2,0,-4.2,6.3639,0,-6.3639,8.3151,0,-3.4443,7,0,-1.4],
// 3 16 7 0 -1.4 4.2 0 -1.4 4.2 0 -4.2
  [3,16,7,0,-1.4,4.2,0,-1.4,4.2,0,-4.2],
// 4 16 7 0 -1.4 8.3151 0 -3.4443 9 0 0 7 0 1.4
  [4,16,7,0,-1.4,8.3151,0,-3.4443,9,0,0,7,0,1.4],
// 4 16 7 0 1.4 9 0 0 8.3151 0 3.4443 4.2 0 4.2
  [4,16,7,0,1.4,9,0,0,8.3151,0,3.4443,4.2,0,4.2],
// 4 16 4.2 0 4.2 8.3151 0 3.4443 6.3639 0 6.3639 4.2 0 7
  [4,16,4.2,0,4.2,8.3151,0,3.4443,6.3639,0,6.3639,4.2,0,7],
// 3 16 3.4443 0 8.3151 4.2 0 7 6.3639 0 6.3639
  [3,16,3.4443,0,8.3151,4.2,0,7,6.3639,0,6.3639],
// 4 16 1.4 0 7 4.2 0 7 3.4443 0 8.3151 0 0 9
  [4,16,1.4,0,7,4.2,0,7,3.4443,0,8.3151,0,0,9],
// 4 16 -1.4 0 7 1.4 0 7 0 0 9 -3.4443 0 8.3151
  [4,16,-1.4,0,7,1.4,0,7,0,0,9,-3.4443,0,8.3151],
// 3 16 -3.4443 0 8.3151 -4.2 0 7 -1.4 0 7
  [3,16,-3.4443,0,8.3151,-4.2,0,7,-1.4,0,7],
// 3 16 -3.4443 0 8.3151 -6.3639 0 6.3639 -4.2 0 7
  [3,16,-3.4443,0,8.3151,-6.3639,0,6.3639,-4.2,0,7],
// 4 16 -4.2 0 1.4 -4.2 0 7 -6.3639 0 6.3639 -8.3151 0 3.4443
  [4,16,-4.2,0,1.4,-4.2,0,7,-6.3639,0,6.3639,-8.3151,0,3.4443],
// 4 16 -4.2 0 1.4 -8.3151 0 3.4443 -9 0 0 -7 0 -1.4
  [4,16,-4.2,0,1.4,-8.3151,0,3.4443,-9,0,0,-7,0,-1.4],
// 3 16 -4.2 0 1.4 -7 0 -1.4 -4.2 0 -1.4
  [3,16,-4.2,0,1.4,-7,0,-1.4,-4.2,0,-1.4],
// 4 16 -9 0 0 -8.3151 0 -3.4443 -7 0 -4.2 -7 0 -1.4
  [4,16,-9,0,0,-8.3151,0,-3.4443,-7,0,-4.2,-7,0,-1.4],
// 3 16 -8.3151 0 -3.4443 -6.3639 0 -6.3639 -7 0 -4.2
  [3,16,-8.3151,0,-3.4443,-6.3639,0,-6.3639,-7,0,-4.2],
// 4 16 -4.2 0 -4.2 -7 0 -4.2 -6.3639 0 -6.3639 -4.2 0 -7
  [4,16,-4.2,0,-4.2,-7,0,-4.2,-6.3639,0,-6.3639,-4.2,0,-7],
// 3 16 -6.3639 0 -6.3639 -3.4443 0 -8.3151 -4.2 0 -7
  [3,16,-6.3639,0,-6.3639,-3.4443,0,-8.3151,-4.2,0,-7],
// 4 16 -1.4 0 -7 -4.2 0 -7 -3.4443 0 -8.3151 0 0 -9
  [4,16,-1.4,0,-7,-4.2,0,-7,-3.4443,0,-8.3151,0,0,-9],
// 4 16 4.2 0 4.2 1.4 0 4.2 1.4 0 1.4 4.2 0 1.4
  [4,16,4.2,0,4.2,1.4,0,4.2,1.4,0,1.4,4.2,0,1.4],
// 3 16 4.2 0 4.2 4.2 0 1.4 7 0 1.4
  [3,16,4.2,0,4.2,4.2,0,1.4,7,0,1.4],
];
module ldraw_lib__98138px9(step=0, col=false, unit=2/5, alt=false, line=0.2, solid=!$preview)
    makepoly(ldraw_lib__98138px9(), step=step, col=col, unit=unit, alt=alt, line=line, solid=solid);
ldraw_lib__98138px9(line=0.2);
